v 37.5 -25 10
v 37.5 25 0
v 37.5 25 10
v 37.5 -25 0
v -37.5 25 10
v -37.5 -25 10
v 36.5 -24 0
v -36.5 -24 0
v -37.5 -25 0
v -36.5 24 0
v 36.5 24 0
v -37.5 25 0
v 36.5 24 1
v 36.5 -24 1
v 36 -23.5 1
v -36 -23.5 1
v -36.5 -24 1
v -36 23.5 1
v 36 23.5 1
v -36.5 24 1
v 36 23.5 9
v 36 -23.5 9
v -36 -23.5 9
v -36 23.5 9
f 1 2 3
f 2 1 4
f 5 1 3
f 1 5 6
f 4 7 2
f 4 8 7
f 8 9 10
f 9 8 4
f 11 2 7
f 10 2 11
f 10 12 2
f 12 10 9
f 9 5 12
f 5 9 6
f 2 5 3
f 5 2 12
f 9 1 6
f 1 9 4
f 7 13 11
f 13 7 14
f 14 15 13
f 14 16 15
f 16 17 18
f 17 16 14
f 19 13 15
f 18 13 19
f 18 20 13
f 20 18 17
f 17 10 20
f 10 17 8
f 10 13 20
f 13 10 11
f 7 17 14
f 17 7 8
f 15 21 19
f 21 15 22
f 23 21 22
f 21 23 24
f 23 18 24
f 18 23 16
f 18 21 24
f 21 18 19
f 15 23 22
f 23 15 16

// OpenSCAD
width=75;
length=50;
height=10;

$fn=100;


difference(){
translate([-width/2,-length/2,0]) cube([width,length,height]);
translate([-(width-2)/2,-(length-2)/2,-1]) cube([width-2,length-2,2]);
translate([-(width-3)/2,-(length-3)/2,-1]) cube([width-3,length-3,height]);
}
